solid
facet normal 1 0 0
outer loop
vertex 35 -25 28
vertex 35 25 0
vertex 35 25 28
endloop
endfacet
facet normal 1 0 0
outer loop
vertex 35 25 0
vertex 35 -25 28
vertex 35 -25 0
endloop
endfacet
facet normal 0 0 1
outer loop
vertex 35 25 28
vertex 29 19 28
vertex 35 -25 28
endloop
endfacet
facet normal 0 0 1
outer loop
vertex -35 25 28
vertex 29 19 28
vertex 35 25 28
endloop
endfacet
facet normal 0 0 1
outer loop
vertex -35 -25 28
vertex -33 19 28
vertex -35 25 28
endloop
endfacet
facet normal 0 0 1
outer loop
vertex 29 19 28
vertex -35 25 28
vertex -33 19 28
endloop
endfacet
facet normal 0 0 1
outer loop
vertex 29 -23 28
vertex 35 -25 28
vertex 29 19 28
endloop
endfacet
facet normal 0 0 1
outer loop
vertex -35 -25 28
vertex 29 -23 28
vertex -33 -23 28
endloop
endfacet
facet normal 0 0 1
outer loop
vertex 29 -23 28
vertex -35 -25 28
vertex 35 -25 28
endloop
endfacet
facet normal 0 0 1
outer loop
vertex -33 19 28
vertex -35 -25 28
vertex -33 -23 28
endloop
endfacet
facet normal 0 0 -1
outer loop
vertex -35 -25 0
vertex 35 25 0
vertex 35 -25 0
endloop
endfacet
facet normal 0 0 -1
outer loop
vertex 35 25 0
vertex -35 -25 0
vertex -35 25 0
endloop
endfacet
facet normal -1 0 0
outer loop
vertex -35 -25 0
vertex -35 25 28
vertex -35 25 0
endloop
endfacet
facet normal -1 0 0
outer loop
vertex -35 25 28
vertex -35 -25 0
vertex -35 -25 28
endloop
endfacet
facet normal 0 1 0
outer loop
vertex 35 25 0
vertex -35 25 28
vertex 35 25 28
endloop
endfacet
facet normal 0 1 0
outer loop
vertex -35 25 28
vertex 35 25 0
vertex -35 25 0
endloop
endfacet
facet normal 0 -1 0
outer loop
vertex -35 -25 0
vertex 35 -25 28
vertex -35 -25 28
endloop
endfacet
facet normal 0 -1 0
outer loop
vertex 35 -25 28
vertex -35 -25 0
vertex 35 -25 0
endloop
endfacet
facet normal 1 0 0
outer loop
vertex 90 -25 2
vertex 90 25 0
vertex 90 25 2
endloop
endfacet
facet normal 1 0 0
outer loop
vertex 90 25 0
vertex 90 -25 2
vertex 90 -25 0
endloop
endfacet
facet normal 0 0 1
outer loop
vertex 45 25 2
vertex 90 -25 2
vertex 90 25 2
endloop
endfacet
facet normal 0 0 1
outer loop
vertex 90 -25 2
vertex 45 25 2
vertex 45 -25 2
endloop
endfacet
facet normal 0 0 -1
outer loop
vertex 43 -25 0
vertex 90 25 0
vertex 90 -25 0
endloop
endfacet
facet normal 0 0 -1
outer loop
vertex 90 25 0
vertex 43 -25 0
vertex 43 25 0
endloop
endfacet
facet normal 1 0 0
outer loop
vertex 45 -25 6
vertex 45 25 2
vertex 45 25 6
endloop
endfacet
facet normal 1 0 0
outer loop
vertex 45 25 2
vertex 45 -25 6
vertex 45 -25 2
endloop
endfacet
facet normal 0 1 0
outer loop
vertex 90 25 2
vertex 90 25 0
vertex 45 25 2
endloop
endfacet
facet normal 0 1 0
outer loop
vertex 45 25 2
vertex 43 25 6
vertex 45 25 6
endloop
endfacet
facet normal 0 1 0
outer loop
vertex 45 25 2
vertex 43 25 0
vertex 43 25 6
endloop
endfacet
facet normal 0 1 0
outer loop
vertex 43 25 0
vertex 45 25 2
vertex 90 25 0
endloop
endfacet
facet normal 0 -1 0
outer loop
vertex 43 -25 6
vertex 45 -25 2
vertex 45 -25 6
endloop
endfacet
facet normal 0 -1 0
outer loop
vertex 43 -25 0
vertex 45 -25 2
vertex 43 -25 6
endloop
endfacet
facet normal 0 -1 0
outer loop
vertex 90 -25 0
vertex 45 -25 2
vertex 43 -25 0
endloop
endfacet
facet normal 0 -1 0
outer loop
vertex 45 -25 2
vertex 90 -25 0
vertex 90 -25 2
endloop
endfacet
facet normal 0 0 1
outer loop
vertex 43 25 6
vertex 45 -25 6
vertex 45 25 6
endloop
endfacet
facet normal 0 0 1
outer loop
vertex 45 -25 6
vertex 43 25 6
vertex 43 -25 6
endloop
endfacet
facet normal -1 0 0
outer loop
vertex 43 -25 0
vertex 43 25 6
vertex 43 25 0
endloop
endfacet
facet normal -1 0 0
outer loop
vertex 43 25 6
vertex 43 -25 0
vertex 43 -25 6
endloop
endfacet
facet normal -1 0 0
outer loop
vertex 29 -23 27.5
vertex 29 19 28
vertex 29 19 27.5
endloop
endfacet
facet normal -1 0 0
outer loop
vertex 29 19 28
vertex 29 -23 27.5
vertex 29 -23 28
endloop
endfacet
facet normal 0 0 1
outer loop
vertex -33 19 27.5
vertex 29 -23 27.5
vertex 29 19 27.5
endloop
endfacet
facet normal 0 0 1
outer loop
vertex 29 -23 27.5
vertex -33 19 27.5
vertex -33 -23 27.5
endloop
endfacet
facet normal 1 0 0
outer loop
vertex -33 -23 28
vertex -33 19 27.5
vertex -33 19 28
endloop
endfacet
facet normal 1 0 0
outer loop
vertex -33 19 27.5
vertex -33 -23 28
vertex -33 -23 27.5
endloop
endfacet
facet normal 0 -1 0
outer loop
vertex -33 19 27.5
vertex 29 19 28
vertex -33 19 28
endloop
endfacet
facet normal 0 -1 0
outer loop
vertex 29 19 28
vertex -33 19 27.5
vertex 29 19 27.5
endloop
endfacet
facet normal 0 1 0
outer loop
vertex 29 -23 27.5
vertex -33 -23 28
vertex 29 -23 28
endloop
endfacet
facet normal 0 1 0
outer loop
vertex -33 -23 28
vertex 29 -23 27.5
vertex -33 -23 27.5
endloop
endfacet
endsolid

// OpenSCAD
// Two-part enclosure for a small electronics board (e.g. Arduino-based temperature logger)
// Print orientation: both parts lie flat on the bed, side by side, with a 10 mm gap.
// The box prints as an open-top box; the lid prints upside down so its lip faces up.

// ---------------- Parameters ----------------
box_x      = 70;    // outer length of box (X)
box_y      = 50;    // outer width of box (Y)
box_h      = 30;    // outer height of box (Z)
wall       = 2;     // wall thickness throughout box and lid
floor      = 2;     // floor thickness under the box floor
gap        = 10;    // horizontal gap between box and lid on the bed
eps        = 0.5;   // cutter overshoot past faces

lip_t      = 1.5;   // lip wall thickness
lip_h      = 4;     // lip height above the plate
lip_x      = 65.6;  // outer length of lip
lip_y      = 45.6;  // outer width of lip
clearance  = 0.2;   // clearance between lip outer size and box opening

$fn = 64;

// Derived
box_i_x = box_x - 2 * wall;   // box opening in X
box_i_y = box_y - 2 * wall;   // box opening in Y
lip_x1  = lip_x - 2 * clearance;
lip_y1  = lip_y - 2 * clearance;

// ---------------- Model ----------------
difference() {
    union() {
        // Box: open top, solid floor
        translate([-box_x / 2, -box_y / 2, 0])
            cube([box_x, box_y, box_h - floor]);

        // Lid: plate with centred lip, printed upside down
        translate([box_x / 2 + gap, -box_y / 2, 0])
            cube([box_x / 2 + gap, box_y, 2]);                          // plate
        translate([box_x / 2 + gap - wall, -box_y / 2, 0])
            cube([wall, box_y, lip_h + 2]);                             // lip walls (X / Z)
        translate([box_x / 2 + gap - wall, -box_y / 2 + wall, 0])
            cube([wall, box_y - 2 * wall, lip_h + 2]);                 // lip wall (Y / Z)
    }

    // Cut the lip pocket into the box so the lid slides in with the specified clearance
    translate([-box_x / 2 + wall, -box_y / 2 + wall, box_h - floor - eps])
        cube([box_i_x - 2 * wall, box_i_y - 2 * wall, eps]);
}
